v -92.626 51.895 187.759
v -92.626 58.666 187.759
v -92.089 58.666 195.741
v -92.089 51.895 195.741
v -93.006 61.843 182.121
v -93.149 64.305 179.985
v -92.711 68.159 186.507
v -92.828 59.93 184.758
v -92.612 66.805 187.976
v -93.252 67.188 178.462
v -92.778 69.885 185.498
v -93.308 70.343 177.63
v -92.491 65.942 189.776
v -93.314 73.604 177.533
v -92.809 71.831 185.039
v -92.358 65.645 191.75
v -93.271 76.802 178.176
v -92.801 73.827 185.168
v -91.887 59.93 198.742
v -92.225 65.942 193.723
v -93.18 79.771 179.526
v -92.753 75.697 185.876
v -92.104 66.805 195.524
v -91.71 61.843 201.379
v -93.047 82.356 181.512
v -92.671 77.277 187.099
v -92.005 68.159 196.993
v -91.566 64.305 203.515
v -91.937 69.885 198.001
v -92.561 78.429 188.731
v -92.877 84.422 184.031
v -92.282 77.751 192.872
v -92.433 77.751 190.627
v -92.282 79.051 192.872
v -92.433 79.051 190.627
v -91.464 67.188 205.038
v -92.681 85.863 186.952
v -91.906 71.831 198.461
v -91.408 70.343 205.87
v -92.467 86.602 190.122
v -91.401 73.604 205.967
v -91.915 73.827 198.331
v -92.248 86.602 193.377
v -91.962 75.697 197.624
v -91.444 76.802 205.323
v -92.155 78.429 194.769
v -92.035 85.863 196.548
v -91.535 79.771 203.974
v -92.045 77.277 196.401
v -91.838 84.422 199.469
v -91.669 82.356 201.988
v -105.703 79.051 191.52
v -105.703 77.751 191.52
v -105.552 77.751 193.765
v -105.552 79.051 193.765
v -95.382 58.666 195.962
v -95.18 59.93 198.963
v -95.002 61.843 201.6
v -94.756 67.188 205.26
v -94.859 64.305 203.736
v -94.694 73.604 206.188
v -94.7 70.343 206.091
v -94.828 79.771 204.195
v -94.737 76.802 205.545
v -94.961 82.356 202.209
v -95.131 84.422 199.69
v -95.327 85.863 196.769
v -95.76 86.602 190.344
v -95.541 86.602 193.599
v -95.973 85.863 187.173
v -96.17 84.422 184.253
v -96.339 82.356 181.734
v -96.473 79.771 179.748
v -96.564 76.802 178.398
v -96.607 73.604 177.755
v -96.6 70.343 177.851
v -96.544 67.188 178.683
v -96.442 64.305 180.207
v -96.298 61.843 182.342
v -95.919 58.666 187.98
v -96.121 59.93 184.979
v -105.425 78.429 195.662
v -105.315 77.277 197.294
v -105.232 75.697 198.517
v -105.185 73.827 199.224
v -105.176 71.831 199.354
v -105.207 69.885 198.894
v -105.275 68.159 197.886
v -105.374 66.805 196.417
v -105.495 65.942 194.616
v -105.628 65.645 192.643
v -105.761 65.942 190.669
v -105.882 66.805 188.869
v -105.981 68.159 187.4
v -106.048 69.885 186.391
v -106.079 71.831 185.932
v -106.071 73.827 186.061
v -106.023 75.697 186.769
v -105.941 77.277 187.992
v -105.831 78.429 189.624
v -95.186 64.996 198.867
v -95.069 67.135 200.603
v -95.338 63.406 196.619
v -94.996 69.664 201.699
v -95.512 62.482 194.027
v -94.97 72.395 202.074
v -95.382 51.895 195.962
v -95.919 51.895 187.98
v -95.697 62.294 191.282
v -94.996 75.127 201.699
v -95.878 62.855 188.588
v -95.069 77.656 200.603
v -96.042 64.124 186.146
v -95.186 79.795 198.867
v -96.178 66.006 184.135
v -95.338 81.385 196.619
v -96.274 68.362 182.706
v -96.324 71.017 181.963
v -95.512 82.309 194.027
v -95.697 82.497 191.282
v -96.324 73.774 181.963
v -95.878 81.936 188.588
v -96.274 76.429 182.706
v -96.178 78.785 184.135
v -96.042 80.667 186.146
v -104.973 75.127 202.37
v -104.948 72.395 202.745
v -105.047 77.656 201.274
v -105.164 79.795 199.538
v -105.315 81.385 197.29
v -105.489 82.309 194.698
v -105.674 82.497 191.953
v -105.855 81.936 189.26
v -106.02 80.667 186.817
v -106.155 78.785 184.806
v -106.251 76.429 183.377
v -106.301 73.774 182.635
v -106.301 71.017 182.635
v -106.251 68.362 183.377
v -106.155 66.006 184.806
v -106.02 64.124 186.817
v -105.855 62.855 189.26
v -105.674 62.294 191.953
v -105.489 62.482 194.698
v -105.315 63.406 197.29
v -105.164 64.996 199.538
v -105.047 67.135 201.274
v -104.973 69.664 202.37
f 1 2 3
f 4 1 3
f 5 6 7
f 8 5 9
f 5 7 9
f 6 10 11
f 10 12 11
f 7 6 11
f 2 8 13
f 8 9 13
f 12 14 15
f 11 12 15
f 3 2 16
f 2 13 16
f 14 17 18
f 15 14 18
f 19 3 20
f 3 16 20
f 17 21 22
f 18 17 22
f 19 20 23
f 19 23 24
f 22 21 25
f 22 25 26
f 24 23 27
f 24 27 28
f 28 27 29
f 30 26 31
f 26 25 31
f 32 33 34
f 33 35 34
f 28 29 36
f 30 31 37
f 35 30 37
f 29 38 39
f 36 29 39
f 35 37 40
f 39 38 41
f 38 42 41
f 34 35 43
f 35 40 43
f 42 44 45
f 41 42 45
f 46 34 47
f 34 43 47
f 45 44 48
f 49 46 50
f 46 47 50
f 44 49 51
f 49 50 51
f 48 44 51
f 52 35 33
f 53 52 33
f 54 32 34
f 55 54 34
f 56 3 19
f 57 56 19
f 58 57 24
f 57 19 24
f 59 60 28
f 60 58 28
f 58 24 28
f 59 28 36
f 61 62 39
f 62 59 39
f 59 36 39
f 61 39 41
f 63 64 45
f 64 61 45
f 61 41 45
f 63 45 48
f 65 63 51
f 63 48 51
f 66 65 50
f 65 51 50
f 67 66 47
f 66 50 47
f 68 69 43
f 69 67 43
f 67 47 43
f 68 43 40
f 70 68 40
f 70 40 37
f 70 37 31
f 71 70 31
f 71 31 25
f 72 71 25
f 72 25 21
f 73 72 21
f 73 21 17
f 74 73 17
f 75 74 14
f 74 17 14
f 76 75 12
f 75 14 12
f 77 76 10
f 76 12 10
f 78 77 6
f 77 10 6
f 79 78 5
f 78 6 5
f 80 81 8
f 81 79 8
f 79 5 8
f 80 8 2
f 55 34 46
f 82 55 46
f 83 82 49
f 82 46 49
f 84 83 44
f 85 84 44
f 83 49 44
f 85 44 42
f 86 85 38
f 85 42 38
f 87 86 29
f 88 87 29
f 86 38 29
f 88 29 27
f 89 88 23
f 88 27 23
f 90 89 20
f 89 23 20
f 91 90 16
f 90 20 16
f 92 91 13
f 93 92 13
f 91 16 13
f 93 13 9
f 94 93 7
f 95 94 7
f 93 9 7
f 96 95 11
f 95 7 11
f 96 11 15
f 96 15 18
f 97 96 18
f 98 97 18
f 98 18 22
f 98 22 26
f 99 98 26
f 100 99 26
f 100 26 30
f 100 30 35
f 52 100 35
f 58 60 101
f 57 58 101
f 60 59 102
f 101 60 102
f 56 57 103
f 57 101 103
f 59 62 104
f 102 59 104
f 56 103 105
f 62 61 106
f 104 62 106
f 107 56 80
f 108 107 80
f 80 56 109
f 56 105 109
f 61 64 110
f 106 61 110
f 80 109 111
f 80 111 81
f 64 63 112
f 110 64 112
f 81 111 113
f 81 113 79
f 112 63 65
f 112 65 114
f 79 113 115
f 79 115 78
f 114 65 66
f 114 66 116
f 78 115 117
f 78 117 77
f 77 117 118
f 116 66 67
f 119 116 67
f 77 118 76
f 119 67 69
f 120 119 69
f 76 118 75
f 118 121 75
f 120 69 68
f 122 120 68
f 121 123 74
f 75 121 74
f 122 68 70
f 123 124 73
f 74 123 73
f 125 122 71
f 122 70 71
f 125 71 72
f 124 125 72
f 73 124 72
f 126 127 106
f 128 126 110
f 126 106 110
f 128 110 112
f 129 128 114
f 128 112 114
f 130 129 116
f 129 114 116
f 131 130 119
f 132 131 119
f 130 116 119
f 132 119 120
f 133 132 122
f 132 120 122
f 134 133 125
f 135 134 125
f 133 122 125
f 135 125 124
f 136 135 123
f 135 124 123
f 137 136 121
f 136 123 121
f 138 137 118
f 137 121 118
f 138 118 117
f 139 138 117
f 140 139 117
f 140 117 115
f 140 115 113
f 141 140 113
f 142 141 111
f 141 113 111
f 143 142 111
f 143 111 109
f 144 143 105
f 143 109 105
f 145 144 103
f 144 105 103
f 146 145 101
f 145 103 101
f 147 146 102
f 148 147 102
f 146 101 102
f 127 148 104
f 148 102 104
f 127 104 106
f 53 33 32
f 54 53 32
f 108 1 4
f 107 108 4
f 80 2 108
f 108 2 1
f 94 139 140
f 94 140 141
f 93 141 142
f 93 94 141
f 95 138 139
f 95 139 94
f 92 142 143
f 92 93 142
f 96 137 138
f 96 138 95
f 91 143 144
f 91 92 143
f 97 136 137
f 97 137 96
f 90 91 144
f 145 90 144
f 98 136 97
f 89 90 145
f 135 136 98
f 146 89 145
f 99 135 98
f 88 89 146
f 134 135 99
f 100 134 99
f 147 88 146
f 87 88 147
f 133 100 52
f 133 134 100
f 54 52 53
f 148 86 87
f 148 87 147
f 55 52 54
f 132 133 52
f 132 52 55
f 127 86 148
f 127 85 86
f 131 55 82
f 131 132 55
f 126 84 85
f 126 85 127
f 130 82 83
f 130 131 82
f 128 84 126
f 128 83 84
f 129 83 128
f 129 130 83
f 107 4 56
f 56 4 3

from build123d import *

# Parameters (mm, degrees)
ESQUISSE2_R             = 10.125
BOSS_EXTRU_1_DEPTH      = 10
ENL_V_MAT_EXTRU_1_DEPTH = 218.649228582
BOSS_EXTRU_2_START      = -3.3
BOSS_EXTRU_2_DEPTH      = 3.3


with BuildPart() as part:
    # Esquisse1 → Révolution1 (revolve)
    with BuildSketch(Plane(origin=(0, 72.395438751, 0), x_dir=(-1, 0, 0), z_dir=(0, 1, 0))):
        Polygon((91.397628985, 206.017597396), (92.357726425, 191.749864118), (95.650280259, 191.971425065), (94.690182819, 206.239158344), align=None)
    revolve(axis=Axis((-92.670542197, 72.395438751, 191.770913966), (-0.9977435859079083, 0, 0.06713968111056465)))

    # Esquisse2 → Boss.-Extru.1 (add)
    with BuildSketch(Plane(origin=(-108.078931537, 0, 7.272795436), x_dir=(0.06713968111057397, 0, 0.9977435859079078), z_dir=(-0.9977435859079079, 0, 0.06713968111057397))):
        with Locations((185.116328722, 72.395438751)):
            Circle(ESQUISSE2_R)
    extrude(amount=BOSS_EXTRU_1_DEPTH)

    # Esquisse3 → Enlèv. mat.-Extru.1 (cut, through all)
    with BuildSketch(Plane(origin=(-104.786377704, 0, 7.051234489), x_dir=(-0.06713968111057397, 0, -0.9977435859079078), z_dir=(0.9977435859079079, 0, -0.06713968111057397))):
        with BuildLine():
            Line((-186.241328722, 77.751028507), (-186.241328722, 79.051028507))
            ThreePointArc((-186.241328722, 79.051028507), (-185.116328722, 65.645438751), (-183.991328722, 79.051028507))
            Line((-183.991328722, 79.051028507), (-183.991328722, 77.751028507))
            Line((-183.991328722, 77.751028507), (-186.241328722, 77.751028507))
        make_face()
    extrude(amount=-ENL_V_MAT_EXTRU_1_DEPTH, mode=Mode.SUBTRACT)

    # Esquisse8 → Boss.-Extru.2 (add)
    with BuildSketch(Plane(origin=(-108.078931537, 0, 7.272795436), x_dir=(0.06713968111056465, 0, 0.9977435859079083), z_dir=(-0.9977435859079085, 0, 0.06713968111056466)).offset(BOSS_EXTRU_2_START)):
        with BuildLine():
            Line((181.116328722, 58.666272717), (181.116328722, 51.895438751))
            Line((181.116328722, 51.895438751), (189.116328722, 51.895438751))
            Line((189.116328722, 51.895438751), (189.116328722, 58.666272717))
            ThreePointArc((189.116328722, 58.666272717), (185.116328722, 58.095438751), (181.116328722, 58.666272717))
        make_face()
    extrude(amount=BOSS_EXTRU_2_DEPTH)


solid = part.part
